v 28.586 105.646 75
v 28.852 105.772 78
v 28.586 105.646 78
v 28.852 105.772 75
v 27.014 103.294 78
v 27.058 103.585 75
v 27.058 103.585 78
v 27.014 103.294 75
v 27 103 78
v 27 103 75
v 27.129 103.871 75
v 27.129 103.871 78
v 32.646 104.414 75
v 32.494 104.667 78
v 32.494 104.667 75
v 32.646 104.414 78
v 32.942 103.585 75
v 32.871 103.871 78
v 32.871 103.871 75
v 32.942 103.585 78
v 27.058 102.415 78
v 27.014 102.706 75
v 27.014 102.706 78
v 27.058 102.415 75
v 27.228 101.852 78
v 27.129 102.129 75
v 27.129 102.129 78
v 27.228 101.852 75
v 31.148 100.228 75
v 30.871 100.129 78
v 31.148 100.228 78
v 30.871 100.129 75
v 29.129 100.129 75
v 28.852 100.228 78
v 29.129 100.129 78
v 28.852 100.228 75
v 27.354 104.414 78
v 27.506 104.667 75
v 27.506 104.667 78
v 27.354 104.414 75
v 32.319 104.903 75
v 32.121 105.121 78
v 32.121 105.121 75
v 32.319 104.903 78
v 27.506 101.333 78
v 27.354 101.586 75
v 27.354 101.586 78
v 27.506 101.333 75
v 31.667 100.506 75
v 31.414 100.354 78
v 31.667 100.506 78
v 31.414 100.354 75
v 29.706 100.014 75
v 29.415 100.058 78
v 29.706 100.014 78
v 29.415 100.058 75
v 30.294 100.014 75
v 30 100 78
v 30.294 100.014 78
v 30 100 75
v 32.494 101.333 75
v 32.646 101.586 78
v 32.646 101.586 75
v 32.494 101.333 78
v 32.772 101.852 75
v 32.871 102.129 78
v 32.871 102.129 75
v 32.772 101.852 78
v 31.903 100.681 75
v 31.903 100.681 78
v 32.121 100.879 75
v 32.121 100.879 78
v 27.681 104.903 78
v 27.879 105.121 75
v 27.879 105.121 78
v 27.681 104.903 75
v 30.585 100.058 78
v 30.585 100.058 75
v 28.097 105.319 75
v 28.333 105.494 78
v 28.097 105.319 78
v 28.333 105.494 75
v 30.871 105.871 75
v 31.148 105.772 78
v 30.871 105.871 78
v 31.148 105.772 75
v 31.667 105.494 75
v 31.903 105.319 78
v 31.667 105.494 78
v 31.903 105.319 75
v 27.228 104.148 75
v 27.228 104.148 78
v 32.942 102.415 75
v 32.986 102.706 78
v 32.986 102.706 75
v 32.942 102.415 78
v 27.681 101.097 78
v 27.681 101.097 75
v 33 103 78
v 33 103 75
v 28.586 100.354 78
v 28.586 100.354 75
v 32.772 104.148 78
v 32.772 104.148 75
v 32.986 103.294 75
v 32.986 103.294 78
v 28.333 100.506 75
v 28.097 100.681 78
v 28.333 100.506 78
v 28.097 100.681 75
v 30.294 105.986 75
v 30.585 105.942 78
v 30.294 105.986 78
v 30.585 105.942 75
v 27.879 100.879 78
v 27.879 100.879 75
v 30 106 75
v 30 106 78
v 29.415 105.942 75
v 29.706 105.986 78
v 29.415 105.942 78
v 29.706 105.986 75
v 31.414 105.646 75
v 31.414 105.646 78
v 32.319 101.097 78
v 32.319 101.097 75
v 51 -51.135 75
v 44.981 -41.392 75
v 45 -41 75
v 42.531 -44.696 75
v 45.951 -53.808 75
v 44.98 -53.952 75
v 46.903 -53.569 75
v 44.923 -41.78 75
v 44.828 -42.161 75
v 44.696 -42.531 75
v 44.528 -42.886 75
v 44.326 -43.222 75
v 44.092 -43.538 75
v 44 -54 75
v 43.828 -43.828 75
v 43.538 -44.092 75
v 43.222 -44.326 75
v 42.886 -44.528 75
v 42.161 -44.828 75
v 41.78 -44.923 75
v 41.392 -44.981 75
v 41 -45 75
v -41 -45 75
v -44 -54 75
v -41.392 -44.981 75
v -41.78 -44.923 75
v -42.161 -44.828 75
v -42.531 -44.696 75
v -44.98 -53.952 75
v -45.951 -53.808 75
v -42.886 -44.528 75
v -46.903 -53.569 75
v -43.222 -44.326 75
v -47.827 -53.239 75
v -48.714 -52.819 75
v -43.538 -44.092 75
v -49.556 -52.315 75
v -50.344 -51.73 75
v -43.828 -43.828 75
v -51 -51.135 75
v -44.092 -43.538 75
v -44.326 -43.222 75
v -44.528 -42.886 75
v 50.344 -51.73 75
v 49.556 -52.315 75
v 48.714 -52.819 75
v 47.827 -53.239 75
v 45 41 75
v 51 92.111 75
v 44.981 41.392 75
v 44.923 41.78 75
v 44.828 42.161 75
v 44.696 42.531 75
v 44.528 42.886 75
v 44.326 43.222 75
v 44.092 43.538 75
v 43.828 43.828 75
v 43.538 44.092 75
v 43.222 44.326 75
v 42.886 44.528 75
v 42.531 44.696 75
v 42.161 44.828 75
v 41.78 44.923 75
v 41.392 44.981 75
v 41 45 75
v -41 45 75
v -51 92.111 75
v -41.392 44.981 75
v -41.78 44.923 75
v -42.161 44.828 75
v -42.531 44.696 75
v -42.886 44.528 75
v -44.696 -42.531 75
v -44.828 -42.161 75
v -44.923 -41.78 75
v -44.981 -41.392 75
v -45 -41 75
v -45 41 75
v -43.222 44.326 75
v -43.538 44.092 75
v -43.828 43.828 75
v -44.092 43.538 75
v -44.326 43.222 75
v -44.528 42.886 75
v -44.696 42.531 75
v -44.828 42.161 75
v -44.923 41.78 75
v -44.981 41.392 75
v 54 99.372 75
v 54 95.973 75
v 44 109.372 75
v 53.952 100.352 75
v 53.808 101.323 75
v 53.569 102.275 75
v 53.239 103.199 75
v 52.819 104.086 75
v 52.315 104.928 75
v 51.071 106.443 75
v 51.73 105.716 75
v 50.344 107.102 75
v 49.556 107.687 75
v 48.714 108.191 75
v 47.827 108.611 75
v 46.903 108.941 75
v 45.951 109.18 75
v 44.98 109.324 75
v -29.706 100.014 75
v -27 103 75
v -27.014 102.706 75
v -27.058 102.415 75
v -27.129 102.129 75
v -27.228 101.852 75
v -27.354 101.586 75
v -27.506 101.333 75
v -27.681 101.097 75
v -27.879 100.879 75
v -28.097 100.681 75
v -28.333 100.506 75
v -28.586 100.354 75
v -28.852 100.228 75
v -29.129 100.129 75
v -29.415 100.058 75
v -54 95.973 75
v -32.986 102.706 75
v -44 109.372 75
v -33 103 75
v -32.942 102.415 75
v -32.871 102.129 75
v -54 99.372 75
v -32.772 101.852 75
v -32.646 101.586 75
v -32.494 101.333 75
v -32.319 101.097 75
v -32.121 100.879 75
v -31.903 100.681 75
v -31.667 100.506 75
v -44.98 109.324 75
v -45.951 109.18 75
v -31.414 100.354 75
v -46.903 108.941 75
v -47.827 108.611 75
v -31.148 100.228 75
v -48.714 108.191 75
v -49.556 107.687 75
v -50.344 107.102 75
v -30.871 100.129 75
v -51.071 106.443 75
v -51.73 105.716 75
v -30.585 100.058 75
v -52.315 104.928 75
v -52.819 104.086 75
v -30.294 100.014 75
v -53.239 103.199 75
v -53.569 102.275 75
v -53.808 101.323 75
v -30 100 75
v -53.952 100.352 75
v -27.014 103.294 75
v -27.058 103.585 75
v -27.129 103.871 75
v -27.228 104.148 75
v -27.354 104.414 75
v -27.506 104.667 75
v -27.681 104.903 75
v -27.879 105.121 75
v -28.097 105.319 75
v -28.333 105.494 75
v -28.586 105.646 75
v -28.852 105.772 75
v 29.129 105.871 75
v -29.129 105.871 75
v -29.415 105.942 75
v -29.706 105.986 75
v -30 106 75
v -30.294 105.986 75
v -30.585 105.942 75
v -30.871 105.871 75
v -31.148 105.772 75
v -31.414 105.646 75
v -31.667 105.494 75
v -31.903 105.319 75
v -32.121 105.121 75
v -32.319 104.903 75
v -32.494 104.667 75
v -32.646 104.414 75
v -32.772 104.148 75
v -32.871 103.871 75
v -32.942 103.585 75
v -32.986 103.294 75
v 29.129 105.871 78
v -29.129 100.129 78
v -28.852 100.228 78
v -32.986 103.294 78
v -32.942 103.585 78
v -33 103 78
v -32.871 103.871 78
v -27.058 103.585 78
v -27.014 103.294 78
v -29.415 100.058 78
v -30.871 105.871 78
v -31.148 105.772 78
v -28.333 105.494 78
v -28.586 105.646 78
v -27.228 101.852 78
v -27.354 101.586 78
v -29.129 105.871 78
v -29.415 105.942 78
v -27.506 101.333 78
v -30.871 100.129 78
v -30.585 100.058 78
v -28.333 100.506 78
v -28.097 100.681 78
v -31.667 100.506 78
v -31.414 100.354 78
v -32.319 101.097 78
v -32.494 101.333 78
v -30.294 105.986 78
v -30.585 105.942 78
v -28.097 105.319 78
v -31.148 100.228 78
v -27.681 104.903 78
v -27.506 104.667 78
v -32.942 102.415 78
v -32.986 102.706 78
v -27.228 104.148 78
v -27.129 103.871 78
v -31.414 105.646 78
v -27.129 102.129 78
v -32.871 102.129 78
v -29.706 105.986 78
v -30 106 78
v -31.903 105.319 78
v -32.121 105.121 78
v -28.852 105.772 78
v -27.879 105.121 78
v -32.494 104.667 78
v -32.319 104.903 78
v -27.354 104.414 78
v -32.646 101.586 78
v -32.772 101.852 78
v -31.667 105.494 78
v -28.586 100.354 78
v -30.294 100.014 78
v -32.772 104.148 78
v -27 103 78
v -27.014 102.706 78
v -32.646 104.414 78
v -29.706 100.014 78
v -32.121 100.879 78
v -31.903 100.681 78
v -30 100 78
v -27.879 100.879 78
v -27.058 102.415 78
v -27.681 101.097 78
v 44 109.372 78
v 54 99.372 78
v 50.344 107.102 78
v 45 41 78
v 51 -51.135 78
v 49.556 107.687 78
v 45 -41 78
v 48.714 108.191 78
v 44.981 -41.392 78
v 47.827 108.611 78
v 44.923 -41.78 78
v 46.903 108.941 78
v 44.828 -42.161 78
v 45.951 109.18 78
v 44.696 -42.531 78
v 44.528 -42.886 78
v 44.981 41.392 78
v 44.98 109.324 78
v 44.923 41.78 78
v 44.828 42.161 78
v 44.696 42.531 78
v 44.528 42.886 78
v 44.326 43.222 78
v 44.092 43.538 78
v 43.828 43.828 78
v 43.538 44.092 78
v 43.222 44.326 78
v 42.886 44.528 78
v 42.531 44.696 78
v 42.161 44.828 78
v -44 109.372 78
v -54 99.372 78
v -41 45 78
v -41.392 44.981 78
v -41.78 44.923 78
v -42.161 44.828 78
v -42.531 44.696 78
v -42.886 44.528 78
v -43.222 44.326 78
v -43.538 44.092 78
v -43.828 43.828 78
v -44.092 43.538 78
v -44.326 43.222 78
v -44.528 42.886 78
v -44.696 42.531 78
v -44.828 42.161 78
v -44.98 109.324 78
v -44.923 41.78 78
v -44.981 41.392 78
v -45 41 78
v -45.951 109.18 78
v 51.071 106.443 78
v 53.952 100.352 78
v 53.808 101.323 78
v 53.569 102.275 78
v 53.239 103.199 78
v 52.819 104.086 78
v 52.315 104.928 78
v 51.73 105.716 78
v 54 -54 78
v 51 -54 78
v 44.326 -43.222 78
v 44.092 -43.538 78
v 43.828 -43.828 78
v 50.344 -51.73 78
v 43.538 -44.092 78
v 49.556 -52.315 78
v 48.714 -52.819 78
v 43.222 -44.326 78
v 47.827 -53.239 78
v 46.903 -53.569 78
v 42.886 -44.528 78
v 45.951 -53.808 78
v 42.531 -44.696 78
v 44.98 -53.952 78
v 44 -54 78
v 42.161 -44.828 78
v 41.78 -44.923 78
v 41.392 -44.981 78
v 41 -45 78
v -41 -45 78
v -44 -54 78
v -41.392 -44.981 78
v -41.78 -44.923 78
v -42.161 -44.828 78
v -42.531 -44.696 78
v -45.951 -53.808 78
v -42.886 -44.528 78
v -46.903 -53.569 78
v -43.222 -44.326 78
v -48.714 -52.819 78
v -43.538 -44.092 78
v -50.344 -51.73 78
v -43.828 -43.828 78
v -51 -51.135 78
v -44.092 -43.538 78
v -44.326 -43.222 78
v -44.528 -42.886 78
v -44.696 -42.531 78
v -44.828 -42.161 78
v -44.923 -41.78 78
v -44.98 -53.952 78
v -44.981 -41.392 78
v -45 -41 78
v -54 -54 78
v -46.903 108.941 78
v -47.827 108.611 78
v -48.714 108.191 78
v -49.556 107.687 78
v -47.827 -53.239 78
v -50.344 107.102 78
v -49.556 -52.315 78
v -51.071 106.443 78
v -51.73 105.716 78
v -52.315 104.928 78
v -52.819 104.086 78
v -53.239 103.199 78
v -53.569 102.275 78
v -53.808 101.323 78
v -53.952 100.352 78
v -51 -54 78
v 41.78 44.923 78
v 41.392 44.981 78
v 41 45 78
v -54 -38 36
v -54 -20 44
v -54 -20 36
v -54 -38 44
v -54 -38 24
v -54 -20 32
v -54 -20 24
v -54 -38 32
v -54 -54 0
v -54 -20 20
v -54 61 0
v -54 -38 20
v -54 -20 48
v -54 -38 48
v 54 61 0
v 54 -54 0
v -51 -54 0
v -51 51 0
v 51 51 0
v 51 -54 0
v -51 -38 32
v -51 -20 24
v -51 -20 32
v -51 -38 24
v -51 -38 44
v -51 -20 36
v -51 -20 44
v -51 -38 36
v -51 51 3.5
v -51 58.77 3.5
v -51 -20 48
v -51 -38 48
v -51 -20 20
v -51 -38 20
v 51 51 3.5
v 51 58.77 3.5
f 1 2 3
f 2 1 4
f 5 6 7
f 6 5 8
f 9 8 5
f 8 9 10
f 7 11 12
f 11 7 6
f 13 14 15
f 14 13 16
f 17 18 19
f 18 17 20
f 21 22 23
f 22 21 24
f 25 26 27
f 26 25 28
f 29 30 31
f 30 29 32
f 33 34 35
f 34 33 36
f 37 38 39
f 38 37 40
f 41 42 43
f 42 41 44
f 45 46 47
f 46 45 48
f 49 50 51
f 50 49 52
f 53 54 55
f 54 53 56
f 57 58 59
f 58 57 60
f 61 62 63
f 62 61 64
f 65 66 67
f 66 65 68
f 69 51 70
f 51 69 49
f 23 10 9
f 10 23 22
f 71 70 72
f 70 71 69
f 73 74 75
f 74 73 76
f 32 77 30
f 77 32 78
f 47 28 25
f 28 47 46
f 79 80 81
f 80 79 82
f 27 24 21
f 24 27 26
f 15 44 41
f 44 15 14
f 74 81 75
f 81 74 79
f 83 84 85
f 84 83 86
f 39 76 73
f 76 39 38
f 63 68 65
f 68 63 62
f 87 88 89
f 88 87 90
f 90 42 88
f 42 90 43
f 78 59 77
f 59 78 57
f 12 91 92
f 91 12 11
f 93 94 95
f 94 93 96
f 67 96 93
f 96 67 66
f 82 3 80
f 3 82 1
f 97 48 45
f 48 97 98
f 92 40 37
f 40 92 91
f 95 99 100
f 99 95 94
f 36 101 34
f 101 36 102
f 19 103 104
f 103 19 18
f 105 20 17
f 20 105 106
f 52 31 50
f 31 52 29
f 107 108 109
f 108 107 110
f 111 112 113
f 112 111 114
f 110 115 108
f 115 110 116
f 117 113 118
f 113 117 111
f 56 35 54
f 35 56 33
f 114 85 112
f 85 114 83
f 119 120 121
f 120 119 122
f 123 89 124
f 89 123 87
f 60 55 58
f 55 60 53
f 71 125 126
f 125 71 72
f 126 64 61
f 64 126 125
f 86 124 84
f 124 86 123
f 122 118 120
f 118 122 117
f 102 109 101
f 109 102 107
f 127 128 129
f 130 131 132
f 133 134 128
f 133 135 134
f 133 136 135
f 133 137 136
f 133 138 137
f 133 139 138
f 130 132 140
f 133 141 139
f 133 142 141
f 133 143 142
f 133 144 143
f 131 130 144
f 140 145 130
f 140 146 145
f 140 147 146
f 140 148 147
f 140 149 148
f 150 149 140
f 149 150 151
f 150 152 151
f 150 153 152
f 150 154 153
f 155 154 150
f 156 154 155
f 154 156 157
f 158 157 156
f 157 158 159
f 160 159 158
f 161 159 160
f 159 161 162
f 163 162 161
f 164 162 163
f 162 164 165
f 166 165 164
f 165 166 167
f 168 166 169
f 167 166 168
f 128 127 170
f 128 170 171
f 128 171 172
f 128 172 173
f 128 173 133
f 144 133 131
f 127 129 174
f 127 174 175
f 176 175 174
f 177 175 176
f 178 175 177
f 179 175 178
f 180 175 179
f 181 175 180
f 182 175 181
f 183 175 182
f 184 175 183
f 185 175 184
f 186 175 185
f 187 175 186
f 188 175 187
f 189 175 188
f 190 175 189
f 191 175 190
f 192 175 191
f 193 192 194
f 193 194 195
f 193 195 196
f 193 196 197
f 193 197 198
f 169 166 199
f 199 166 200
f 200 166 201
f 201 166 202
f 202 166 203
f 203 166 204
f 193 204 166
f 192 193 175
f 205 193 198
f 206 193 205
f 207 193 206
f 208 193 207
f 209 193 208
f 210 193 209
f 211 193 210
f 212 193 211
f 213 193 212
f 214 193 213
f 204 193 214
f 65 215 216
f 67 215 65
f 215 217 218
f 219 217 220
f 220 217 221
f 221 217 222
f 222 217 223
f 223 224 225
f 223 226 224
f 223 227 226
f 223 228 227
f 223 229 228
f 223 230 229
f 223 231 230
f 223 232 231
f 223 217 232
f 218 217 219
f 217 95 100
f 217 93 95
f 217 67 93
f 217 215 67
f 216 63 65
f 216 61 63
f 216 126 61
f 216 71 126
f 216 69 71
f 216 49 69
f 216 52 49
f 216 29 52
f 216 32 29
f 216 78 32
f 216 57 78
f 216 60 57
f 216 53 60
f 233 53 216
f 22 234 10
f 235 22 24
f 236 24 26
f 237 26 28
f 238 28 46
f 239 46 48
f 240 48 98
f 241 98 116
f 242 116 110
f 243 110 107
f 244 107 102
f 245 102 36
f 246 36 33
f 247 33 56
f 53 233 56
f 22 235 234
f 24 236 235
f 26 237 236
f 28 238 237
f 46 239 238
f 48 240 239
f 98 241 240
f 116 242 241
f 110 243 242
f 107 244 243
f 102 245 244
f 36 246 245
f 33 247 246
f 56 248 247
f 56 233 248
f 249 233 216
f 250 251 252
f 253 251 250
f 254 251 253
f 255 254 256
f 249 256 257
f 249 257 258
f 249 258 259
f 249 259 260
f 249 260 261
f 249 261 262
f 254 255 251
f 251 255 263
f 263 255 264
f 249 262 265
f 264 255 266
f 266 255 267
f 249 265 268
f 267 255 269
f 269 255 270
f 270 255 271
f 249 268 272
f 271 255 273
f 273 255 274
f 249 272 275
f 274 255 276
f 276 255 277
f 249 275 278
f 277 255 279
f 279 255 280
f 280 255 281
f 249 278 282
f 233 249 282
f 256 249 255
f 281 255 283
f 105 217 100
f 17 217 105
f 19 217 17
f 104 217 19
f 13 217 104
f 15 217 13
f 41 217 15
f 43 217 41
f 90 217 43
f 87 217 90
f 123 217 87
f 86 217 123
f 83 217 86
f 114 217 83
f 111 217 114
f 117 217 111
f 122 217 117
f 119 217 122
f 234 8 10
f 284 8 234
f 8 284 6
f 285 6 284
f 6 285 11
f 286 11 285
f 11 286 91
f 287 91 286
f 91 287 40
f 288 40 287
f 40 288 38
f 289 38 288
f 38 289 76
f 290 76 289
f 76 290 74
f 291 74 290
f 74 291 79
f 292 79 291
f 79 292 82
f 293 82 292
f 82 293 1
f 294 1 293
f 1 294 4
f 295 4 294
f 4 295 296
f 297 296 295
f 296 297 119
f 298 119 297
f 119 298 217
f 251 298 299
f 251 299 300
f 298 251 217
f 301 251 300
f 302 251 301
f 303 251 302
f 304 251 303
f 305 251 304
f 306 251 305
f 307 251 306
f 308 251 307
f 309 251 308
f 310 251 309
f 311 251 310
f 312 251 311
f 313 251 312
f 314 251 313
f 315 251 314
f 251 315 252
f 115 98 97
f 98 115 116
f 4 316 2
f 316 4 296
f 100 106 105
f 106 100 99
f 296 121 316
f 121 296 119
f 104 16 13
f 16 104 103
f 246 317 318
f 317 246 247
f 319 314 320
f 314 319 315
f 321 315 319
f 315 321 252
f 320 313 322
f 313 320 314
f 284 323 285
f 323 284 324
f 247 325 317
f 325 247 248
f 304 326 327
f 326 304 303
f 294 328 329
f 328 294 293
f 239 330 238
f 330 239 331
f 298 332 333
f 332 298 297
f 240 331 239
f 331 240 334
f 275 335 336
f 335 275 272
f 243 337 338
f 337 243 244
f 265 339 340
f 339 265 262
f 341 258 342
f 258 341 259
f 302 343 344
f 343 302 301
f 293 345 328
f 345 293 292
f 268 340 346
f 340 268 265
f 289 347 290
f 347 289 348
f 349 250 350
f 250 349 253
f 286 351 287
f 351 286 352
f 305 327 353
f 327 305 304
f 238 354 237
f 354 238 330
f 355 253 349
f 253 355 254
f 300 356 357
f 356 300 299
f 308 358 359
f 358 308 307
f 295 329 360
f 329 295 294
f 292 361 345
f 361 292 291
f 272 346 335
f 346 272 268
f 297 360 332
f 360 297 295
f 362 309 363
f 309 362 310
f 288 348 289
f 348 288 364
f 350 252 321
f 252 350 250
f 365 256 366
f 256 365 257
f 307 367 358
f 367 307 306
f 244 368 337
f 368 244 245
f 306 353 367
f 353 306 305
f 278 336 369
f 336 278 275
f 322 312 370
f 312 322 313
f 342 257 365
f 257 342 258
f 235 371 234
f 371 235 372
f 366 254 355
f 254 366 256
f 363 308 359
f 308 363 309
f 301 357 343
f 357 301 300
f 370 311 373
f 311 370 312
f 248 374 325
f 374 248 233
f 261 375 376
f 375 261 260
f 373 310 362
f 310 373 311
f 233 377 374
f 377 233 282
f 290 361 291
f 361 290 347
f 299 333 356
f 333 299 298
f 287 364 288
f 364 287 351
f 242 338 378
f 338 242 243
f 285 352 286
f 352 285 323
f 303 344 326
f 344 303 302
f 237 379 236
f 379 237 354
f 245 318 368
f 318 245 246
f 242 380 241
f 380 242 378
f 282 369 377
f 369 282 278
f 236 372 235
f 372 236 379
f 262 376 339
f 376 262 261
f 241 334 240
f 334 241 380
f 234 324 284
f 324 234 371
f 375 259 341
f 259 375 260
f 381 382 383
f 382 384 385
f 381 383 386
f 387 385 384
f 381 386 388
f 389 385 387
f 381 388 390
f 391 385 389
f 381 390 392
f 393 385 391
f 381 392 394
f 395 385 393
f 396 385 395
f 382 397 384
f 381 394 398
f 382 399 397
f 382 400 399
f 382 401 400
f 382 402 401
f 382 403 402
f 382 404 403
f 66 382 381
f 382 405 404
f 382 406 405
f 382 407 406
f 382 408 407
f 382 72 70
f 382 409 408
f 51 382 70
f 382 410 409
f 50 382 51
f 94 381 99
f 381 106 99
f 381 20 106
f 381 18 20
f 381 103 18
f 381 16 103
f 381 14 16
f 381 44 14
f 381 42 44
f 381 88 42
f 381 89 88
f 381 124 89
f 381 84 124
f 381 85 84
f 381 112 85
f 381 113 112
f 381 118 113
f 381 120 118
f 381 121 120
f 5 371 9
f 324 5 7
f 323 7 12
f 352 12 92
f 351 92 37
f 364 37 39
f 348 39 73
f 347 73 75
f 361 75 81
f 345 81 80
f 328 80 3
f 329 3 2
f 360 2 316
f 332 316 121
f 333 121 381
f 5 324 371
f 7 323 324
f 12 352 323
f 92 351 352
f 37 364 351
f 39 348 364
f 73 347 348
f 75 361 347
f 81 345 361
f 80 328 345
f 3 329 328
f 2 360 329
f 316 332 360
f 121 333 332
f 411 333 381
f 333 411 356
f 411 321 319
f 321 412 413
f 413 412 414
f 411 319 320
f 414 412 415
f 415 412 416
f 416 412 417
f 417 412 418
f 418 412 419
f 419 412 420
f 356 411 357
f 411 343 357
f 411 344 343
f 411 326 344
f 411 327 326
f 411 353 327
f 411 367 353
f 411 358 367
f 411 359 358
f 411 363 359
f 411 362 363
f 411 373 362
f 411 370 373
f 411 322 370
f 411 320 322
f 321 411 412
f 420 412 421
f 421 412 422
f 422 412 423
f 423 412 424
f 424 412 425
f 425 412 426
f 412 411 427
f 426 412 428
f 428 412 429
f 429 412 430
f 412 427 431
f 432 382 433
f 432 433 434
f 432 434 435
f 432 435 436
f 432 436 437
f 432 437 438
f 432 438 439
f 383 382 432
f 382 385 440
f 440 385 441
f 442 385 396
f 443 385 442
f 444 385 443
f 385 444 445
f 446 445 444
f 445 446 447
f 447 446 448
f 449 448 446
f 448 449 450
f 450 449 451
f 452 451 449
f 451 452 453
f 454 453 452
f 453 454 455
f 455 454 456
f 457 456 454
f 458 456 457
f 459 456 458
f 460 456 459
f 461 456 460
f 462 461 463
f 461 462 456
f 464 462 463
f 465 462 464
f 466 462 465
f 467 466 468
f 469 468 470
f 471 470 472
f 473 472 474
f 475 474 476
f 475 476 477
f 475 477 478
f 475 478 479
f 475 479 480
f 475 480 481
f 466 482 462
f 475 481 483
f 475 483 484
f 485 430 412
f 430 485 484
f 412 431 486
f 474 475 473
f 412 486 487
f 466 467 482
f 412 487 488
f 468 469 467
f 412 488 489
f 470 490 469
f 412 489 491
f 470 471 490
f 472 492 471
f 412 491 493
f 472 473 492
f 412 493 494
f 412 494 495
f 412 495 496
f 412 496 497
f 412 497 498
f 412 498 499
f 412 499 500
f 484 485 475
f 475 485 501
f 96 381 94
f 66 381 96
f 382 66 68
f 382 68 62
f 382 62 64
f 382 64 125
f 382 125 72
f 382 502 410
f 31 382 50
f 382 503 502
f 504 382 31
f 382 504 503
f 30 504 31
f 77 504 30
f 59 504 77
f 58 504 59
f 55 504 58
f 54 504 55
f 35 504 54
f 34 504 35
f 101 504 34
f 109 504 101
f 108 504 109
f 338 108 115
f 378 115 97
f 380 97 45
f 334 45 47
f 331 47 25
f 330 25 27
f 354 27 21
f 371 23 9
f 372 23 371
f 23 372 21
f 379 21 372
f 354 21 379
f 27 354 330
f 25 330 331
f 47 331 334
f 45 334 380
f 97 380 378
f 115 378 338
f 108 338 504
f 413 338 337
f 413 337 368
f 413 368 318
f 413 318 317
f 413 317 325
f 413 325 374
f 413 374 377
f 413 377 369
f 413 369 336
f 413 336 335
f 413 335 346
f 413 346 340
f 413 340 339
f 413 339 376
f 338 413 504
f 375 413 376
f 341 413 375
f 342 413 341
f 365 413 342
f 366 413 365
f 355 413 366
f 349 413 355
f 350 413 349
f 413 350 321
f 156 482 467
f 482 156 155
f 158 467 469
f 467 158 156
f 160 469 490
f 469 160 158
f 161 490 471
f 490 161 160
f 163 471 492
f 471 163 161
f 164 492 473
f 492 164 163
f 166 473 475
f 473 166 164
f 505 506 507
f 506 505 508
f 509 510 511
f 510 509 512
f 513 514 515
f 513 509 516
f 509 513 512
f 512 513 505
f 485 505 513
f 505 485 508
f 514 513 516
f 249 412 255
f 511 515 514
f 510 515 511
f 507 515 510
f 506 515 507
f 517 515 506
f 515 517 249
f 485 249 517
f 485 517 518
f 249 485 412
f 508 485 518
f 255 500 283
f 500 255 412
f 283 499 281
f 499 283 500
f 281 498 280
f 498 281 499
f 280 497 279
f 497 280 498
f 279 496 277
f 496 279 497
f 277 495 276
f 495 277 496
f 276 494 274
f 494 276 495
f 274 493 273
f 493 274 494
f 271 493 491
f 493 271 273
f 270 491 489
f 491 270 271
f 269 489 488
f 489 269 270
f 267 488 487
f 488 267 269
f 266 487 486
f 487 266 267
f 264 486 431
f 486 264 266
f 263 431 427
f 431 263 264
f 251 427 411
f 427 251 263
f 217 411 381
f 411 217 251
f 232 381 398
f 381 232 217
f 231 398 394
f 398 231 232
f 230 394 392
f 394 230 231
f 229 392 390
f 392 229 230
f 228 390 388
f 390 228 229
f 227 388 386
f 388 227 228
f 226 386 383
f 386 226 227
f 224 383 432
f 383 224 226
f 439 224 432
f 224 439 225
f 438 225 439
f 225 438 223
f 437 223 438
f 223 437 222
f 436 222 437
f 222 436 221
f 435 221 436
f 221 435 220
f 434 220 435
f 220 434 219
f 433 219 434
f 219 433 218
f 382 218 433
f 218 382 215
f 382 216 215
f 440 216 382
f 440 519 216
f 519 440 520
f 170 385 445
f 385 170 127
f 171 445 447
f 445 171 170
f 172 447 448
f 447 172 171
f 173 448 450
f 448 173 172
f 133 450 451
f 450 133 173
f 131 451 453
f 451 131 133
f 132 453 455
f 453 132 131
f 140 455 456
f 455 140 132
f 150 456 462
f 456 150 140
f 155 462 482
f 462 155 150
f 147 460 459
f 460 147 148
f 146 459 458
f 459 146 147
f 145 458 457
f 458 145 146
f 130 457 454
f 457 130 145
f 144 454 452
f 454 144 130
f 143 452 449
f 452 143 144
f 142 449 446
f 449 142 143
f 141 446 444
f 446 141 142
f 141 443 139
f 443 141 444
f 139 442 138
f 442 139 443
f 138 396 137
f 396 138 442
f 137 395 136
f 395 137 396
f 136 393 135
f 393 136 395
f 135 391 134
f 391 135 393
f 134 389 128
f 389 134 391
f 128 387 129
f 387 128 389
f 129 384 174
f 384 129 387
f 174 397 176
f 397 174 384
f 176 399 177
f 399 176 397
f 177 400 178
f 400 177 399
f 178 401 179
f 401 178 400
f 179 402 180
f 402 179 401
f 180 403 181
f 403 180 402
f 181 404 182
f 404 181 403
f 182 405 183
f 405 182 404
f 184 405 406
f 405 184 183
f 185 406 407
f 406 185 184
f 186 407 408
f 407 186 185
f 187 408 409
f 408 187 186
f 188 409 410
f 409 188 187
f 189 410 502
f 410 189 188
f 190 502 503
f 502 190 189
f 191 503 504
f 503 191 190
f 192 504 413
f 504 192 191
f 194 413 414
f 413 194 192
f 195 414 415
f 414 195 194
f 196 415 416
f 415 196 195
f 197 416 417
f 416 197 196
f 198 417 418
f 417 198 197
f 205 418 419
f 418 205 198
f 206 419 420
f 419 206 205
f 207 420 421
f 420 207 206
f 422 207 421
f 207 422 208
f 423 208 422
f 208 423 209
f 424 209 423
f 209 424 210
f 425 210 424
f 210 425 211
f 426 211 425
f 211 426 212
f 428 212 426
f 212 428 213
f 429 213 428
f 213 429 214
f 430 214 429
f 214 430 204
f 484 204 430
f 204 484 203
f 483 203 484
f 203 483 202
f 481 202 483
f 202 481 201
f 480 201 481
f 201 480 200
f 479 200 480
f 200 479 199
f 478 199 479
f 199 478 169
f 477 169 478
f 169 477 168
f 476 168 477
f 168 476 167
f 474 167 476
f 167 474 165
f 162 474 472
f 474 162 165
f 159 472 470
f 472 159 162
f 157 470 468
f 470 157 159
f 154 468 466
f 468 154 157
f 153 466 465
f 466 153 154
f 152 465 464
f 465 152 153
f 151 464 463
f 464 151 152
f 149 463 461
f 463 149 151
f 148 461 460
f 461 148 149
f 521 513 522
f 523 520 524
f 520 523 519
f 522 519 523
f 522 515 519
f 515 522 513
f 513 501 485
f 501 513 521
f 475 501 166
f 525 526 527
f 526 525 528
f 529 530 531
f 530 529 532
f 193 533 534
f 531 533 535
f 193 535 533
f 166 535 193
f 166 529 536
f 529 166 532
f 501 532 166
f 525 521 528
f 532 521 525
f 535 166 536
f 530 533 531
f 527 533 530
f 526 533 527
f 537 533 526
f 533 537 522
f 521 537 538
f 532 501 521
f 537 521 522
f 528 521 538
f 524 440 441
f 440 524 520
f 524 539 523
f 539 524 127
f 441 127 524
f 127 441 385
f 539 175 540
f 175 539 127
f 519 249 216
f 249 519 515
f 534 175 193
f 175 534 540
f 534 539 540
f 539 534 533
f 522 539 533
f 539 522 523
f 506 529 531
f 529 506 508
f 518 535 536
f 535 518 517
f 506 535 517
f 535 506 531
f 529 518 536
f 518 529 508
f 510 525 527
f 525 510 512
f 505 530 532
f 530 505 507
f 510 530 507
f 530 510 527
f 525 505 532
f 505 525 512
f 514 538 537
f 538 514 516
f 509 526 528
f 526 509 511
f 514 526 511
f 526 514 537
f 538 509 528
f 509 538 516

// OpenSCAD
// ============================================================
//  86型插座防泼溅挡板（兼容漏电保护插头）— Outlet Splash Guard
//  参数化 OpenSCAD 模型
//
//  用途：贴装于 86 型插座面板外侧，防止自上而下的泼溅水
//        顺墙面流入插座。顶部雨棚 + 滴水沿将水流引导至
//        插头前方排走；前下方完全敞开，兼容带漏电保护
//        插头（热水器等）的大体积插头的插拔、散热与排水。
//
//  安装：裙边背面用 3M VHB 胶带/结构胶粘贴于面板边缘
//        与墙面；上方挡板预留 2 个膨胀管孔，可选打钉
//        加固。窗口正中露出面板，原面板固定螺丝仍可
//        正常拆装。
//
//  打印：前缘朝下平放打印，全程无支撑；顶部一层裙边
//        存在约 100mm 桥接，切片器默认桥接设置即可。
// ============================================================

// ===== 参数定义 =====

/* [86 面板与贴合] */
face_w    = 86;      // mm  86 型面板宽度
face_h    = 86;      // mm  86 型面板高度
clearance = 2;       // mm  窗口单边间隙
margin    = 11;      // mm  贴合裙边单边宽度（粘贴面）
flange_t  = 3;       // mm  裙边厚度
corner_r  = 10;      // mm  裙边外圆角
win_r     = 4;       // mm  窗口圆角

/* [可选加固] */
anchor_holes = true;
anchor_d  = 6;       // mm  M4/M5 膨胀管预埋孔直径
anchor_x  = 30;      // mm  锚孔横向间距（对称分布）
anchor_y  = 103;     // mm  锚孔高度（须在挡水沿实心区内，避开顶棚线）

/* [罩体] */
wall_t    = 3;       // mm  侧壁厚
depth     = 78;      // mm  罩体总深（内腔深 ≈ depth - flange_t）
vent_slots = true;   //     侧壁下部通风槽（位置低，顶部泼溅不会灌入）
vent_w    = 4;       // mm  通风槽宽（沿深度方向）
vent_h    = 18;      // mm  通风槽高（沿高度方向）
vent_y0   = -38;     // mm  通风槽下沿高度（相对面板中心）
vent_z0   = 30;      // mm  通风槽起始深度
vent_n    = 3;       //     每侧通风槽数量
vent_pitch = 12;     // mm  通风槽间距

/* [顶棚] */
roof_slope = 25;     // °   顶棚下倾角（引导水流向前往下排）
roof_t     = 3.5;    // mm  顶棚法向厚度
drip_clear = 18;     // mm  滴水沿距面板上沿的净高
drip_lip   = 10;     // mm  滴水沿下翻边高度（截断水膜回流）
upstand_h  = 12;     // mm  贴墙挡水沿高出顶棚的高度

/* [输出] */
print_orientation = true;  // true=打印姿态（前缘朝下）/ false=上墙姿态

// ===== 内部参数（一般无需修改） =====
overlap = 1;   // mm  侧壁顶缘埋入顶棚的重叠量（消除共面布尔退化，
               //      必须小于顶棚垂直向等效厚度）
$fn = 64;

// ===== 内部派生尺寸 =====

_outer_w = face_w + 2 * margin;    // 裙边外宽（=外高）
_win_w   = face_w + 2 * clearance; // 窗口边长
_half_w  = _outer_w / 2;

_tan     = tan(roof_slope);
_y_high  = face_h / 2 + drip_clear + depth * _tan;  // 顶棚顶面贴墙处高度
_y_drip  = _y_high - depth * _tan;                  // 滴水沿顶面高度
_t_v     = roof_t / cos(roof_slope);                // 顶棚垂直向等效厚度
_y_u_0   = _y_high - _t_v;                          // 顶棚底面高度 @ z=0
_y_u_d   = _y_u_0 - depth * _tan;                   // 顶棚底面高度 @ z=depth
_y_u_lip = _y_u_0 - (depth - roof_t) * _tan;        // 顶棚底面高度 @ 滴水沿内侧
_seal_top = _y_high + upstand_h;                    // 挡水沿顶部高度

echo(str("外廓: ", _outer_w, " x ", _seal_top + _half_w, " x ", depth,
         " mm  内腔: ", _outer_w - 2 * wall_t, " x ", depth - flange_t, " mm"));

// ===== 辅助模块 =====

// 圆角矩形（关于原点对称）
module rrect(w, h, r) {
    offset(r = r) offset(delta = -r) square([w, h], center = true);
}

// 沿 X 向拉伸 (wall_z, wall_y) 平面轮廓
//   pts: [[z, y], ...]，拉伸后轮廓位于 x ∈ [x0, x1]
//   映射：轮廓 u=wall_z → 世界 Z，v=wall_y → 世界 Y，拉伸 w → 世界 X
module extrude_profile(pts, x0, x1) {
    translate([x0, 0, 0])
        multmatrix([[0, 0, 1, 0],
                    [0, 1, 0, 0],
                    [1, 0, 0, 0]])
            linear_extrude(height = x1 - x0)
                polygon(points = pts);
}

// ===== 部件模块 =====

// 贴墙裙边：环绕面板的框 + 面板上方的实心挡板（含挡水沿）
module flange_plate() {
    linear_extrude(height = flange_t) {
        difference() {
            union() {
                rrect(_outer_w, _outer_w, corner_r);
                translate([0, (_win_w / 2 + _seal_top) / 2, 0])
                    rrect(_outer_w, _seal_top - _win_w / 2, corner_r);
            }
            rrect(_win_w, _win_w, win_r);
        }
    }
}

// 顶棚：下倾雨棚 + 前端滴水沿，横跨整个宽度
module roof_body() {
    pts = [
        [0,        _y_high],                      // 贴墙处顶面
        [depth,    _y_drip],                      // 滴水沿顶面外缘
        [depth,    _y_drip - drip_lip],           // 滴水沿外沿向下翻
        [depth - roof_t, _y_drip - drip_lip],     // 滴水沿内侧
        [depth - roof_t, _y_u_lip],            // 回到顶棚底面
        [0,        _y_high - _t_v],               // 贴墙处底面
    ];
    extrude_profile(pts, -_half_w, _half_w);
}

// 侧壁：顶缘抬高 overlap 埋入顶棚体内，前后贯通到前缘
module side_walls() {
    pts = [
        [0,     -_half_w],
        [depth, -_half_w],
        [depth, _y_u_d + overlap],
        [0,     _y_u_0 + overlap],
    ];
    extrude_profile(pts, _half_w - wall_t, _half_w);
    mirror([1, 0, 0])
        extrude_profile(pts, _half_w - wall_t, _half_w);
}

// ===== 开孔 =====

// 锚孔：贯穿上方实心挡板（避开窗口、顶棚与侧壁，仅削裙边）
module anchor_holes_cut() {
    for (sx = [-1, 1])
        translate([sx * anchor_x, anchor_y, -0.1])
            cylinder(d = anchor_d, h = flange_t + 0.1);
}

// 侧壁下部通风槽
module vent_slots_cut() {
    for (i = [0 : vent_n - 1])
        for (side = [-1, 1])
            translate([side * (_half_w - wall_t - 1), vent_y0,
                       vent_z0 + i * vent_pitch])
                cube([wall_t + 2, vent_h, vent_w]);
}

// ===== 整体 =====

module splash_guard() {
    difference() {
        union() {
            // 锚孔只开在裙边上，避免切割器咬伤上方侧壁
            difference() {
                flange_plate();
                if (anchor_holes) anchor_holes_cut();
            }
            roof_body();
            side_walls();
        }
        if (vent_slots) vent_slots_cut();
    }
}

// ===== 执行入口 =====

if (print_orientation) {
    // 打印姿态：前缘（含滴水沿）朝下，无支撑
    translate([0, 0, depth]) rotate([0, 180, 0]) splash_guard();
} else {
    // 上墙姿态：Z 轴为出墙方向
    splash_guard();
}

// ===== 快速测试：取消注释以单独预览某个模块 =====
// splash_guard();
